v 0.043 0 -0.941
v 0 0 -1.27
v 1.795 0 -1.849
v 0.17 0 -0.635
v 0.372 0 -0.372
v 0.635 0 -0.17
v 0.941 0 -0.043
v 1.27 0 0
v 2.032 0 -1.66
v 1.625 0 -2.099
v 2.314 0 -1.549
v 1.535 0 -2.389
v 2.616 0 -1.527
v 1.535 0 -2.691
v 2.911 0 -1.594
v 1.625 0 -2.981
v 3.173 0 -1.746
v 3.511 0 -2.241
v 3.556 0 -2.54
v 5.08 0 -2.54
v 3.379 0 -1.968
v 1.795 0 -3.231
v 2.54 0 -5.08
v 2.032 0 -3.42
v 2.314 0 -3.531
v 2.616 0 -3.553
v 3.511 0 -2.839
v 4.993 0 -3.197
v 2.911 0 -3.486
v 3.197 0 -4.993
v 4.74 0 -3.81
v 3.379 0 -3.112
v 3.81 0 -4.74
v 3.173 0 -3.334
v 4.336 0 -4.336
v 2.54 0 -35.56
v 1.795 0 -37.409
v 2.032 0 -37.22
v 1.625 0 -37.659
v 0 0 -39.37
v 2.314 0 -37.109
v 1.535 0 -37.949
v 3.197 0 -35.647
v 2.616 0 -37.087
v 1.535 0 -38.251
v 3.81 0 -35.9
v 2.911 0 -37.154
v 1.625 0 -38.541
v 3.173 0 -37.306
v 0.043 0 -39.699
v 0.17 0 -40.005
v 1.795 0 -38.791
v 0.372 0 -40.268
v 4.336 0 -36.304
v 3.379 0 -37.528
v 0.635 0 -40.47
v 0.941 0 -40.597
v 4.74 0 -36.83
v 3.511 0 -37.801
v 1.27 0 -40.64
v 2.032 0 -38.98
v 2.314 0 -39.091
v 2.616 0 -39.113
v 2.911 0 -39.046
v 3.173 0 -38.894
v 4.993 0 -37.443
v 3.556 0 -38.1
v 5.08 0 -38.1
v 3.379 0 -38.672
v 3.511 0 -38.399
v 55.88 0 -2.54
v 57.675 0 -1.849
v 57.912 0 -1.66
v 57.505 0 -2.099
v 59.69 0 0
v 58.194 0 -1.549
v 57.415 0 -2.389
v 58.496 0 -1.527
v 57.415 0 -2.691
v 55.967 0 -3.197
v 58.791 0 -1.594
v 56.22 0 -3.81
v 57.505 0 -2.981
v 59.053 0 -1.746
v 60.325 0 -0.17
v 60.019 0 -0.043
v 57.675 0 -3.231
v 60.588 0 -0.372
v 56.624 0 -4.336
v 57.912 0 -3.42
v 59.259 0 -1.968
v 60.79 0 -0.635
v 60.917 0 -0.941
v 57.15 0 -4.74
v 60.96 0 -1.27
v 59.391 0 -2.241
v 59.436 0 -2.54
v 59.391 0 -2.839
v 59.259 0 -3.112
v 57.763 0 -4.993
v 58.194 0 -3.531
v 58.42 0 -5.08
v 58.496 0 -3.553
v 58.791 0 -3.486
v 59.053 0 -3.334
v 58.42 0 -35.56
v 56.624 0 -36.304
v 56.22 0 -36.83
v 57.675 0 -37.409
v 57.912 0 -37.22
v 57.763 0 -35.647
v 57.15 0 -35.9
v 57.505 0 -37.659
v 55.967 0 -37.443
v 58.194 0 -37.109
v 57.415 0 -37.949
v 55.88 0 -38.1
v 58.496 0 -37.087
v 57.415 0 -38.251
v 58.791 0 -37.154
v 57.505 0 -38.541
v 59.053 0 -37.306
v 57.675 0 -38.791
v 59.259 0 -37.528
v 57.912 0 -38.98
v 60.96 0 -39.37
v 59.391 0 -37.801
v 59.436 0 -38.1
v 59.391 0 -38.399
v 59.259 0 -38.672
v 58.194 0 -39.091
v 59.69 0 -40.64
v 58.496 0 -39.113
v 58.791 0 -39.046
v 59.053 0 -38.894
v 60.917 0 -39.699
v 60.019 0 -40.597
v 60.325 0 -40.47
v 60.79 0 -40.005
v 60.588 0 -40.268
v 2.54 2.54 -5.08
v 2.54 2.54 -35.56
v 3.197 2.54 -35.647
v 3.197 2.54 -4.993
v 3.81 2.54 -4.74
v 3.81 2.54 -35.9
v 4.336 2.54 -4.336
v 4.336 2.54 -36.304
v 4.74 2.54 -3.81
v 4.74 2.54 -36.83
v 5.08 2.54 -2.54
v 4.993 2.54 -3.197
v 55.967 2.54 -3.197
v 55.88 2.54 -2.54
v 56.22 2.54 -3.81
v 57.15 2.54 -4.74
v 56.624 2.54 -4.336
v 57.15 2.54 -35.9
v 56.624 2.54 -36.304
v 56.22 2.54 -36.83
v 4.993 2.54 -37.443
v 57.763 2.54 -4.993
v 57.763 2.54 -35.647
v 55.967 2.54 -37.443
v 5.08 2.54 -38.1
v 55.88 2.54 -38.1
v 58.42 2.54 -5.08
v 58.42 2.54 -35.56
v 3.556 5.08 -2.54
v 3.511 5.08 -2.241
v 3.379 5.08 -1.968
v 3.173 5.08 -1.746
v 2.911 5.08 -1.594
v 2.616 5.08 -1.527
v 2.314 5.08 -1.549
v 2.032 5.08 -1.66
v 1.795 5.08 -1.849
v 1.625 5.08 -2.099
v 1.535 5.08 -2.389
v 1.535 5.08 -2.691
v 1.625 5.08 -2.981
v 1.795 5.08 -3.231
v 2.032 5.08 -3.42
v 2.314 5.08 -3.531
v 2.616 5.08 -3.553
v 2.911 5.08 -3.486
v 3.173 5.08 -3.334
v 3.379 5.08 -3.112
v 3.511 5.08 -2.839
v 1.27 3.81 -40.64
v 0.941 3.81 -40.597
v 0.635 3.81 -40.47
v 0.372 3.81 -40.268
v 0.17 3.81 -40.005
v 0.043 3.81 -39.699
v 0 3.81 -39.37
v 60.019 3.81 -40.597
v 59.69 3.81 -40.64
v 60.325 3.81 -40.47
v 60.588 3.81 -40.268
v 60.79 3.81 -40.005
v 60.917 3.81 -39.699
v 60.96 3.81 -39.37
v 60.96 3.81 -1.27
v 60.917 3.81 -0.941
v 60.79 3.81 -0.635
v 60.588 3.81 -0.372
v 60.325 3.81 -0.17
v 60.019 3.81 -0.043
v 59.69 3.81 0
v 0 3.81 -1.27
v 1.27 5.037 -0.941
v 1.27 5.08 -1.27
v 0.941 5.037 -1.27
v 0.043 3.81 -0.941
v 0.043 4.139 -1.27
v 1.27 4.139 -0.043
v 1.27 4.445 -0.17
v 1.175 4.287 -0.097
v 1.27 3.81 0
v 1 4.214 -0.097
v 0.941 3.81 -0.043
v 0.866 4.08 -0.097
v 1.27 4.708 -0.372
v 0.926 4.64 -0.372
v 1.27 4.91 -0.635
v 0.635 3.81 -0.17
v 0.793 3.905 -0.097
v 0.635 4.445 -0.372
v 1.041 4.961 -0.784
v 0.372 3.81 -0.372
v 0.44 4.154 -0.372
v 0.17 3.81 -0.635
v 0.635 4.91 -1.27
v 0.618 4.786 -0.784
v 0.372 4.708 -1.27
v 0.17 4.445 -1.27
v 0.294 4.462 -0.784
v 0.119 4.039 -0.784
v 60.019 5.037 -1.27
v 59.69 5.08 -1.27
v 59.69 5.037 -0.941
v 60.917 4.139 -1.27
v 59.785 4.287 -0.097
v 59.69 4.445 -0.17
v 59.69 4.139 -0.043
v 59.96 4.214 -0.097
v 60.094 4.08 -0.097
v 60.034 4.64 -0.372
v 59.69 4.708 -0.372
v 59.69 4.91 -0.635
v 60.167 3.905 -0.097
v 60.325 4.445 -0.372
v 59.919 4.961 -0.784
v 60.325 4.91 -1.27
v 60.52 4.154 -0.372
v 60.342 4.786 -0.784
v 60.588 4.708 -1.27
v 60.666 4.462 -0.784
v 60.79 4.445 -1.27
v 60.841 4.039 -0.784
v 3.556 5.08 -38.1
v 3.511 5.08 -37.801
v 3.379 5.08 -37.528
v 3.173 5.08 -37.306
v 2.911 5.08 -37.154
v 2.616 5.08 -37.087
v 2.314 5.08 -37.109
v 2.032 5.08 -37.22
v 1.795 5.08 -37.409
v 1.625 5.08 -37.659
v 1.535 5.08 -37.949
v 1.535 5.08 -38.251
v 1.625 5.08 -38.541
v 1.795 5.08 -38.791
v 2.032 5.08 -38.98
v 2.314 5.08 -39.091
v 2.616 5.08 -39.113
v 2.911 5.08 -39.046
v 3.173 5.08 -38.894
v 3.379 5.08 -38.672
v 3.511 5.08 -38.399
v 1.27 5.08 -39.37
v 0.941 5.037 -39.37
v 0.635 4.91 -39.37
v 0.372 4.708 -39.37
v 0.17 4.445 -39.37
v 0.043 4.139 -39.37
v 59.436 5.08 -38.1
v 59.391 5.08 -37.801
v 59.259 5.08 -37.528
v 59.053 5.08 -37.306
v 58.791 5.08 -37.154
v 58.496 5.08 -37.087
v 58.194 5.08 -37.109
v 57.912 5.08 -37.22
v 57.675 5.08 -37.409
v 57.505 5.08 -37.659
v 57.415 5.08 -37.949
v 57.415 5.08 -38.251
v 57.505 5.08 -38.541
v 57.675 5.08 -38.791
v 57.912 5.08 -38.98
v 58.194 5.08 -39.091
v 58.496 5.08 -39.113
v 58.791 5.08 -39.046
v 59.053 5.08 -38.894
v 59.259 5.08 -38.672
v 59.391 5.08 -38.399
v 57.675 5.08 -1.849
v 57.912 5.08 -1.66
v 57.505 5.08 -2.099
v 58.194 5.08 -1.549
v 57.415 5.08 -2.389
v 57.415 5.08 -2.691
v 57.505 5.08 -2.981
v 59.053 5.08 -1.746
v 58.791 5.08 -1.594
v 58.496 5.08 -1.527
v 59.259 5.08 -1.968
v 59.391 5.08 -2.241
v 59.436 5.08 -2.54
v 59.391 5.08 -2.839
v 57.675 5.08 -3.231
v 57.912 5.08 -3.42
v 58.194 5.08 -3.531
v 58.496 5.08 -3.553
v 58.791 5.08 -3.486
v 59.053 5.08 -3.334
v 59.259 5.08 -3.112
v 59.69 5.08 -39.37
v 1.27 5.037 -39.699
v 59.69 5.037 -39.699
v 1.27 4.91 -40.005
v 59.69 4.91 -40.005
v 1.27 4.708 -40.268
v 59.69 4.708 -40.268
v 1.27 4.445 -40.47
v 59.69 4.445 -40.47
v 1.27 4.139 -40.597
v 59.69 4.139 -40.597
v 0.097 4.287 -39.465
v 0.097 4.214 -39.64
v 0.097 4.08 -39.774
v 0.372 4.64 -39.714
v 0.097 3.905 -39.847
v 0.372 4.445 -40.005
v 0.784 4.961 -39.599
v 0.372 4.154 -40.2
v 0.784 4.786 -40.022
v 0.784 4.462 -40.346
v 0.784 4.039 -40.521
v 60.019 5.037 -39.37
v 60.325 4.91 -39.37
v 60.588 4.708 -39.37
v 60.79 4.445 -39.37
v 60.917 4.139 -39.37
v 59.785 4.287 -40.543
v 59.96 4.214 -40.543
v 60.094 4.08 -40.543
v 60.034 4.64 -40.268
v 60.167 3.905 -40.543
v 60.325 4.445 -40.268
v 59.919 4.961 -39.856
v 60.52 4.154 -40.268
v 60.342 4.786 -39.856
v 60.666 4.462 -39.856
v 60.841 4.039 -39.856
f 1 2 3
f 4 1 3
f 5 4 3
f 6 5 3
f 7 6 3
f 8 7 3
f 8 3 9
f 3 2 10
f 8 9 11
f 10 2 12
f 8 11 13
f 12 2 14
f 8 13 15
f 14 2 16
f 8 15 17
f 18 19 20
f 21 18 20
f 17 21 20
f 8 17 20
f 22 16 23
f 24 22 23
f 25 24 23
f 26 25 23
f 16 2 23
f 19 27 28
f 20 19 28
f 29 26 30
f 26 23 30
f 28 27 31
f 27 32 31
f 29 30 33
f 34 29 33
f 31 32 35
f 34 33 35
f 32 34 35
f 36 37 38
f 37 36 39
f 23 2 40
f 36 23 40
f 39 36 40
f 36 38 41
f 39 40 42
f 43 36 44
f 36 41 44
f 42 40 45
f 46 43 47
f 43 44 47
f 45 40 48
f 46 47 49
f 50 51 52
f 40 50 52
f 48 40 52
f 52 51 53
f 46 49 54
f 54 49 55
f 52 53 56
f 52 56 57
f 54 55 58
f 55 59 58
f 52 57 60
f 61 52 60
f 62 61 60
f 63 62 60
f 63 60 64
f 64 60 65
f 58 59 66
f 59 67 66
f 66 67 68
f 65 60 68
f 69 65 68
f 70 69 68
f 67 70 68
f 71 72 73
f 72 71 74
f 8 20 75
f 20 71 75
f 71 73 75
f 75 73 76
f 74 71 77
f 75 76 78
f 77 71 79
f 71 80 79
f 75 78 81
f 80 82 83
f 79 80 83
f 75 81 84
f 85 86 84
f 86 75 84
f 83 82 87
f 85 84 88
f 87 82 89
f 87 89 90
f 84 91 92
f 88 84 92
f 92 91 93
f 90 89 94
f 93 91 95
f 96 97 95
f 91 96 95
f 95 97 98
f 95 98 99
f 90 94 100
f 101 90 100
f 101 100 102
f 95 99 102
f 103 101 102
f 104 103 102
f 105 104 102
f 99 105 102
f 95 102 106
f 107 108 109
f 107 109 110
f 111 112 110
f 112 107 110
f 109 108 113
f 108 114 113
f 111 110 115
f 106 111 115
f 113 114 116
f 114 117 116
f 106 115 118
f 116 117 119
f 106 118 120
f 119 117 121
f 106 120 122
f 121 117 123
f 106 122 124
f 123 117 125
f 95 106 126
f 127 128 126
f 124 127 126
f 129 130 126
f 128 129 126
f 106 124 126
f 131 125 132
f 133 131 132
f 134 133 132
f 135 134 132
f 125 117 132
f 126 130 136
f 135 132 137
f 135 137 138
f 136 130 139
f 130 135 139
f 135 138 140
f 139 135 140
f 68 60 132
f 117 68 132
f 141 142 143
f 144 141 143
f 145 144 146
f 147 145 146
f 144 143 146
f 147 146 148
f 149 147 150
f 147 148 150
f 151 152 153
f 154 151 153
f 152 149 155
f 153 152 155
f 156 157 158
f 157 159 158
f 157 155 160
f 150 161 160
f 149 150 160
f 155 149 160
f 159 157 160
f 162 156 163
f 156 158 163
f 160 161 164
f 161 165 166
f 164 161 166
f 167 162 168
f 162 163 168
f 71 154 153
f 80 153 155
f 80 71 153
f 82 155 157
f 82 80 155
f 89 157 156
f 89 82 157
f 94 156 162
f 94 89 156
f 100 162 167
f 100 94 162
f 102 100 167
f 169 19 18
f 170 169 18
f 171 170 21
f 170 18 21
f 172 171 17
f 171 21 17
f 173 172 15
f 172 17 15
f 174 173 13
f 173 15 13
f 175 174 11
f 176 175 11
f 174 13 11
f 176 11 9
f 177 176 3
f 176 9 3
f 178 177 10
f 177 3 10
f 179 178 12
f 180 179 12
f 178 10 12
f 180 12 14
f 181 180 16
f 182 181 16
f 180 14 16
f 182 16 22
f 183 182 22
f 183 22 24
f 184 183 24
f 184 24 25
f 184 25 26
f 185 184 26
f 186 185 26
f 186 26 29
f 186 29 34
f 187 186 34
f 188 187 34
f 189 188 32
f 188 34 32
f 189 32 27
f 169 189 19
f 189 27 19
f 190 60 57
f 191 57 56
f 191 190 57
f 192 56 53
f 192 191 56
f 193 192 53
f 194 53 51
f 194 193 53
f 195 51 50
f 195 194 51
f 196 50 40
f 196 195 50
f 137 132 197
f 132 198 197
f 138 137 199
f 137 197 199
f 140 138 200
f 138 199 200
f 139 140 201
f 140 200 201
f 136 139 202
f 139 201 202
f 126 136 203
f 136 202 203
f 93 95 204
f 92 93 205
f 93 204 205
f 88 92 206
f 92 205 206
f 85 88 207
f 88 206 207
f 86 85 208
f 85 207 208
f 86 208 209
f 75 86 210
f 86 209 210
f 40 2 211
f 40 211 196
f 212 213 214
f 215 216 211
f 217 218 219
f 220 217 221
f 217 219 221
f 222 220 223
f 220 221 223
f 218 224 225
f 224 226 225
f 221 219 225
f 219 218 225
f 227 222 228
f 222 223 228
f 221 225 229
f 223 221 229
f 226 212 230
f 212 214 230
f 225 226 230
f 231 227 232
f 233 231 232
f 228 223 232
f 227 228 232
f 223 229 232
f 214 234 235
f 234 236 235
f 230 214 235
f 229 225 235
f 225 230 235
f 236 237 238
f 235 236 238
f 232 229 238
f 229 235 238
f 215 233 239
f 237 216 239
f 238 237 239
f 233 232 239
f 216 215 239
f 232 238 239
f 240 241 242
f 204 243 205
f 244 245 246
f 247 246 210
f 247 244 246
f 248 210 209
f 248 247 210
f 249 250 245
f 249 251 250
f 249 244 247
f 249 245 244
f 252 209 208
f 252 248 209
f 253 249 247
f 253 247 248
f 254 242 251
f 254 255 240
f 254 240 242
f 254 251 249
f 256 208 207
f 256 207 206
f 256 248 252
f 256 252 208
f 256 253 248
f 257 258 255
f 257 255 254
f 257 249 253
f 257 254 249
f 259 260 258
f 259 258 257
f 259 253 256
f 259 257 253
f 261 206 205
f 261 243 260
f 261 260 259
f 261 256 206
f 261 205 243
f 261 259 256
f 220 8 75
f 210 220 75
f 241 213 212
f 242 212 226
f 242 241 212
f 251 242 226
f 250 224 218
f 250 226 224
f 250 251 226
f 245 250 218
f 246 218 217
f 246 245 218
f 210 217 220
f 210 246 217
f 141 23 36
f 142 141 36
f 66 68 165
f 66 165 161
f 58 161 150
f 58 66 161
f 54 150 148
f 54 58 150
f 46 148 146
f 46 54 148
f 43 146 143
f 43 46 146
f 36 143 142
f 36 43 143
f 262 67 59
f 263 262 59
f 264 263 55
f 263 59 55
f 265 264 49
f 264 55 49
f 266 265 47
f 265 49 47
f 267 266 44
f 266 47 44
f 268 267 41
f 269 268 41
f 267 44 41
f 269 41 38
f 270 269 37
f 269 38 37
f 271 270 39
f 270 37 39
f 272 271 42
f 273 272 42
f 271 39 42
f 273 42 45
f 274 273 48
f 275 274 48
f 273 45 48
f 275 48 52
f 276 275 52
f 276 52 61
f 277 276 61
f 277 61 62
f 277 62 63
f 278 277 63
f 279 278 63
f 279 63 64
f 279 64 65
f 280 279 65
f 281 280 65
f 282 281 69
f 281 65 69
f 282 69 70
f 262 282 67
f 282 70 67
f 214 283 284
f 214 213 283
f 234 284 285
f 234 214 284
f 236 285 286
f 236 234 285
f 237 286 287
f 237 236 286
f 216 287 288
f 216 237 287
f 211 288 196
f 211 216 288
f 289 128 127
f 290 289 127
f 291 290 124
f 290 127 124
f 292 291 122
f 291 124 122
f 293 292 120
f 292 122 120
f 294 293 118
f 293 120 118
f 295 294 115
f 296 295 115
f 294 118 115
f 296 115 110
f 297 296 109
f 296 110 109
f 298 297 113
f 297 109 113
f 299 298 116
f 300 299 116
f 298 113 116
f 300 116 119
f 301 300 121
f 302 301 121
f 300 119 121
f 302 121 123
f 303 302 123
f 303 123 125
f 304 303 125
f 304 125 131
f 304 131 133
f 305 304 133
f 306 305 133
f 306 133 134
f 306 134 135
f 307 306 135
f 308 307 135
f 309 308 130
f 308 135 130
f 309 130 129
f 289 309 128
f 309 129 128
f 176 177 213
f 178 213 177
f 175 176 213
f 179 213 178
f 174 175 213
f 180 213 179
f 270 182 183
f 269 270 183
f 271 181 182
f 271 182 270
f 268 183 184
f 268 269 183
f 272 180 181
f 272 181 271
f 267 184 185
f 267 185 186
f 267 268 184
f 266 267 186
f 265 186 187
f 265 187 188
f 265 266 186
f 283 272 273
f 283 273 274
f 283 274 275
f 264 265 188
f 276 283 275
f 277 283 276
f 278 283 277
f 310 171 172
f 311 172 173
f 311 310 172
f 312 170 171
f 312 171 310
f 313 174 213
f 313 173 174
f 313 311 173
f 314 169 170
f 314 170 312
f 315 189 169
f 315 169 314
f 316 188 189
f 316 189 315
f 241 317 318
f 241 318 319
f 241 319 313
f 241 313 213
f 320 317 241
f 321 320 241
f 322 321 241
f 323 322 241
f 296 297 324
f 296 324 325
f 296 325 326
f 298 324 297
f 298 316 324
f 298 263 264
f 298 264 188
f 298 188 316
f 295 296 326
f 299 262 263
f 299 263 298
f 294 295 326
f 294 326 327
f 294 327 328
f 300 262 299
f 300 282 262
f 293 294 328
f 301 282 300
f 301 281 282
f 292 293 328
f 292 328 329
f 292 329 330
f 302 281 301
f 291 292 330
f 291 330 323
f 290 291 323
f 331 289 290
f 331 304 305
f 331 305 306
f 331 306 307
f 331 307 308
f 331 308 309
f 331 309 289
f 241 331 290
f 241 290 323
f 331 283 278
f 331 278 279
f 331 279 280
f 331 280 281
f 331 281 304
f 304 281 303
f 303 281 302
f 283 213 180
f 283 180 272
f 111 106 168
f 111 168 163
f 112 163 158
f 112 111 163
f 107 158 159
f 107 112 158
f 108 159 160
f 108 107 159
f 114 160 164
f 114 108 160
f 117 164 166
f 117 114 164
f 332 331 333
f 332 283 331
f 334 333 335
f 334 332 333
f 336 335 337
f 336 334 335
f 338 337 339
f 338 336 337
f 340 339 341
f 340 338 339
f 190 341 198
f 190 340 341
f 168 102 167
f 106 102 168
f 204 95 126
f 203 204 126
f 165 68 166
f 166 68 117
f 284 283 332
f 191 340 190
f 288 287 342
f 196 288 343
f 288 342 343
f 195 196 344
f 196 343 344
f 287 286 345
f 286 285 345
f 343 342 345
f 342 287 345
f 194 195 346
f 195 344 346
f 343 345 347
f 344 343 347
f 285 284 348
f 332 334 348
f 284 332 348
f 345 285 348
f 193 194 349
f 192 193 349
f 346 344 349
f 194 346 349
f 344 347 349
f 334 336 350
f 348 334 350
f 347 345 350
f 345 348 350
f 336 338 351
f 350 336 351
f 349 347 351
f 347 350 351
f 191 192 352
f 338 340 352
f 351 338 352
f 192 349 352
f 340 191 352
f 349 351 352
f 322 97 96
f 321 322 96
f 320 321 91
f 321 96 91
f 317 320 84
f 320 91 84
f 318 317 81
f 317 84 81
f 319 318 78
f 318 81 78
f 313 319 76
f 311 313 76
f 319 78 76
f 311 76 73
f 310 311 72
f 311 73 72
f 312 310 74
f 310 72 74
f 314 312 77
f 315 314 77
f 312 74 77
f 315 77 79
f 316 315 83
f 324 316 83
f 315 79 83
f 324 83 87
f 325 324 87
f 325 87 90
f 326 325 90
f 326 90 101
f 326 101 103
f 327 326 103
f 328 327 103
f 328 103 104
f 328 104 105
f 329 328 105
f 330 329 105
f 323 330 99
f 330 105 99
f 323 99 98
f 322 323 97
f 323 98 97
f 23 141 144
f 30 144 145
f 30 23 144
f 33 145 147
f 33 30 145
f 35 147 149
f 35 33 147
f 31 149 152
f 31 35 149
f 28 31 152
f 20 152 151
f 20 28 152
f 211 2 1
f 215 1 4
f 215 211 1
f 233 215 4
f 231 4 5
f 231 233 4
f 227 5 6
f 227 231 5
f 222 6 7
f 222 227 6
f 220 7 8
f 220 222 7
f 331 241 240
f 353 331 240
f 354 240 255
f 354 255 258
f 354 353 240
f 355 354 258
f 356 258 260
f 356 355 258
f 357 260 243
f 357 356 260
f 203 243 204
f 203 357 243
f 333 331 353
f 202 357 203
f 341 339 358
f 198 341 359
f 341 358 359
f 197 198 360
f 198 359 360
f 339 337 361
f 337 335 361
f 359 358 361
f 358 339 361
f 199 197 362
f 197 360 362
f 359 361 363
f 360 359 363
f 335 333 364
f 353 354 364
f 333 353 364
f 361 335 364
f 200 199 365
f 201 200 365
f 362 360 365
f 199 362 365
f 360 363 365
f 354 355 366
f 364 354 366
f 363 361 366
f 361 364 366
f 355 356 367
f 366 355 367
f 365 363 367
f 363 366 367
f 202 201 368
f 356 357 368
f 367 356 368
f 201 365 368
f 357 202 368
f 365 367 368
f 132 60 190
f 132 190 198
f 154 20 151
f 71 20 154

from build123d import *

# Parameters (mm, degrees)
SKETCH1_W           = 60.96
SKETCH1_H           = 40.64
BOSS_EXTRUDE1_DEPTH = 5.08
SHELL1_T            = -2.54
SKETCH2_R           = 2.54
BOSS_EXTRUDE2_DEPTH = 5.08
SKETCH3_R           = 1.016
CUT_EXTRUDE1_DEPTH  = 5.08
FILLET2_R           = 1.27


with BuildPart() as part:
    # Sketch1 → Boss-Extrude1 (new body)
    with BuildSketch(Plane(origin=(0, 0, 0), x_dir=(1, 0, 0), z_dir=(0, 1, 0))):
        with Locations((30.48, 20.32)):
            Rectangle(SKETCH1_W, SKETCH1_H)
    extrude(amount=BOSS_EXTRUDE1_DEPTH)

    # Shell1
    shell1_openings = [part.faces().sort_by_distance(p)[0] for p in [
        (30.48, 0, -20.32),
    ]]
    offset(amount=SHELL1_T, openings=shell1_openings, kind=Kind.INTERSECTION)

    # Sketch2 → Boss-Extrude2 (add)
    with BuildSketch(Plane.XZ):
        with Locations((58.42, -38.1)):
            Circle(SKETCH2_R)
        with Locations((58.42, -2.54)):
            Circle(SKETCH2_R)
        with Locations((2.54, -2.54)):
            Circle(SKETCH2_R)
        with Locations((2.54, -38.1)):
            Circle(SKETCH2_R)
    extrude(amount=-BOSS_EXTRUDE2_DEPTH)

    # Sketch3 → Cut-Extrude1 (cut)
    with BuildSketch(Plane.XZ):
        with Locations((58.42, -38.1)):
            Circle(SKETCH3_R)
        with Locations((58.42, -2.54)):
            Circle(SKETCH3_R)
        with Locations((2.54, -2.54)):
            Circle(SKETCH3_R)
        with Locations((2.54, -38.1)):
            Circle(SKETCH3_R)
    extrude(amount=-CUT_EXTRUDE1_DEPTH, mode=Mode.SUBTRACT)

    # Fillet2
    fillet2_edges = [part.edges().sort_by_distance(p)[0] for p in [
        (60.96, 5.08, -20.32),
        (30.48, 5.08, -40.64),
        (0, 5.08, -20.32),
        (30.48, 5.08, 0),
        (0, 2.54, -40.64),
        (60.96, 2.54, -40.64),
        (60.96, 2.54, 0),
        (0, 2.54, 0),
    ]]
    fillet(fillet2_edges, radius=FILLET2_R)


solid = part.part
